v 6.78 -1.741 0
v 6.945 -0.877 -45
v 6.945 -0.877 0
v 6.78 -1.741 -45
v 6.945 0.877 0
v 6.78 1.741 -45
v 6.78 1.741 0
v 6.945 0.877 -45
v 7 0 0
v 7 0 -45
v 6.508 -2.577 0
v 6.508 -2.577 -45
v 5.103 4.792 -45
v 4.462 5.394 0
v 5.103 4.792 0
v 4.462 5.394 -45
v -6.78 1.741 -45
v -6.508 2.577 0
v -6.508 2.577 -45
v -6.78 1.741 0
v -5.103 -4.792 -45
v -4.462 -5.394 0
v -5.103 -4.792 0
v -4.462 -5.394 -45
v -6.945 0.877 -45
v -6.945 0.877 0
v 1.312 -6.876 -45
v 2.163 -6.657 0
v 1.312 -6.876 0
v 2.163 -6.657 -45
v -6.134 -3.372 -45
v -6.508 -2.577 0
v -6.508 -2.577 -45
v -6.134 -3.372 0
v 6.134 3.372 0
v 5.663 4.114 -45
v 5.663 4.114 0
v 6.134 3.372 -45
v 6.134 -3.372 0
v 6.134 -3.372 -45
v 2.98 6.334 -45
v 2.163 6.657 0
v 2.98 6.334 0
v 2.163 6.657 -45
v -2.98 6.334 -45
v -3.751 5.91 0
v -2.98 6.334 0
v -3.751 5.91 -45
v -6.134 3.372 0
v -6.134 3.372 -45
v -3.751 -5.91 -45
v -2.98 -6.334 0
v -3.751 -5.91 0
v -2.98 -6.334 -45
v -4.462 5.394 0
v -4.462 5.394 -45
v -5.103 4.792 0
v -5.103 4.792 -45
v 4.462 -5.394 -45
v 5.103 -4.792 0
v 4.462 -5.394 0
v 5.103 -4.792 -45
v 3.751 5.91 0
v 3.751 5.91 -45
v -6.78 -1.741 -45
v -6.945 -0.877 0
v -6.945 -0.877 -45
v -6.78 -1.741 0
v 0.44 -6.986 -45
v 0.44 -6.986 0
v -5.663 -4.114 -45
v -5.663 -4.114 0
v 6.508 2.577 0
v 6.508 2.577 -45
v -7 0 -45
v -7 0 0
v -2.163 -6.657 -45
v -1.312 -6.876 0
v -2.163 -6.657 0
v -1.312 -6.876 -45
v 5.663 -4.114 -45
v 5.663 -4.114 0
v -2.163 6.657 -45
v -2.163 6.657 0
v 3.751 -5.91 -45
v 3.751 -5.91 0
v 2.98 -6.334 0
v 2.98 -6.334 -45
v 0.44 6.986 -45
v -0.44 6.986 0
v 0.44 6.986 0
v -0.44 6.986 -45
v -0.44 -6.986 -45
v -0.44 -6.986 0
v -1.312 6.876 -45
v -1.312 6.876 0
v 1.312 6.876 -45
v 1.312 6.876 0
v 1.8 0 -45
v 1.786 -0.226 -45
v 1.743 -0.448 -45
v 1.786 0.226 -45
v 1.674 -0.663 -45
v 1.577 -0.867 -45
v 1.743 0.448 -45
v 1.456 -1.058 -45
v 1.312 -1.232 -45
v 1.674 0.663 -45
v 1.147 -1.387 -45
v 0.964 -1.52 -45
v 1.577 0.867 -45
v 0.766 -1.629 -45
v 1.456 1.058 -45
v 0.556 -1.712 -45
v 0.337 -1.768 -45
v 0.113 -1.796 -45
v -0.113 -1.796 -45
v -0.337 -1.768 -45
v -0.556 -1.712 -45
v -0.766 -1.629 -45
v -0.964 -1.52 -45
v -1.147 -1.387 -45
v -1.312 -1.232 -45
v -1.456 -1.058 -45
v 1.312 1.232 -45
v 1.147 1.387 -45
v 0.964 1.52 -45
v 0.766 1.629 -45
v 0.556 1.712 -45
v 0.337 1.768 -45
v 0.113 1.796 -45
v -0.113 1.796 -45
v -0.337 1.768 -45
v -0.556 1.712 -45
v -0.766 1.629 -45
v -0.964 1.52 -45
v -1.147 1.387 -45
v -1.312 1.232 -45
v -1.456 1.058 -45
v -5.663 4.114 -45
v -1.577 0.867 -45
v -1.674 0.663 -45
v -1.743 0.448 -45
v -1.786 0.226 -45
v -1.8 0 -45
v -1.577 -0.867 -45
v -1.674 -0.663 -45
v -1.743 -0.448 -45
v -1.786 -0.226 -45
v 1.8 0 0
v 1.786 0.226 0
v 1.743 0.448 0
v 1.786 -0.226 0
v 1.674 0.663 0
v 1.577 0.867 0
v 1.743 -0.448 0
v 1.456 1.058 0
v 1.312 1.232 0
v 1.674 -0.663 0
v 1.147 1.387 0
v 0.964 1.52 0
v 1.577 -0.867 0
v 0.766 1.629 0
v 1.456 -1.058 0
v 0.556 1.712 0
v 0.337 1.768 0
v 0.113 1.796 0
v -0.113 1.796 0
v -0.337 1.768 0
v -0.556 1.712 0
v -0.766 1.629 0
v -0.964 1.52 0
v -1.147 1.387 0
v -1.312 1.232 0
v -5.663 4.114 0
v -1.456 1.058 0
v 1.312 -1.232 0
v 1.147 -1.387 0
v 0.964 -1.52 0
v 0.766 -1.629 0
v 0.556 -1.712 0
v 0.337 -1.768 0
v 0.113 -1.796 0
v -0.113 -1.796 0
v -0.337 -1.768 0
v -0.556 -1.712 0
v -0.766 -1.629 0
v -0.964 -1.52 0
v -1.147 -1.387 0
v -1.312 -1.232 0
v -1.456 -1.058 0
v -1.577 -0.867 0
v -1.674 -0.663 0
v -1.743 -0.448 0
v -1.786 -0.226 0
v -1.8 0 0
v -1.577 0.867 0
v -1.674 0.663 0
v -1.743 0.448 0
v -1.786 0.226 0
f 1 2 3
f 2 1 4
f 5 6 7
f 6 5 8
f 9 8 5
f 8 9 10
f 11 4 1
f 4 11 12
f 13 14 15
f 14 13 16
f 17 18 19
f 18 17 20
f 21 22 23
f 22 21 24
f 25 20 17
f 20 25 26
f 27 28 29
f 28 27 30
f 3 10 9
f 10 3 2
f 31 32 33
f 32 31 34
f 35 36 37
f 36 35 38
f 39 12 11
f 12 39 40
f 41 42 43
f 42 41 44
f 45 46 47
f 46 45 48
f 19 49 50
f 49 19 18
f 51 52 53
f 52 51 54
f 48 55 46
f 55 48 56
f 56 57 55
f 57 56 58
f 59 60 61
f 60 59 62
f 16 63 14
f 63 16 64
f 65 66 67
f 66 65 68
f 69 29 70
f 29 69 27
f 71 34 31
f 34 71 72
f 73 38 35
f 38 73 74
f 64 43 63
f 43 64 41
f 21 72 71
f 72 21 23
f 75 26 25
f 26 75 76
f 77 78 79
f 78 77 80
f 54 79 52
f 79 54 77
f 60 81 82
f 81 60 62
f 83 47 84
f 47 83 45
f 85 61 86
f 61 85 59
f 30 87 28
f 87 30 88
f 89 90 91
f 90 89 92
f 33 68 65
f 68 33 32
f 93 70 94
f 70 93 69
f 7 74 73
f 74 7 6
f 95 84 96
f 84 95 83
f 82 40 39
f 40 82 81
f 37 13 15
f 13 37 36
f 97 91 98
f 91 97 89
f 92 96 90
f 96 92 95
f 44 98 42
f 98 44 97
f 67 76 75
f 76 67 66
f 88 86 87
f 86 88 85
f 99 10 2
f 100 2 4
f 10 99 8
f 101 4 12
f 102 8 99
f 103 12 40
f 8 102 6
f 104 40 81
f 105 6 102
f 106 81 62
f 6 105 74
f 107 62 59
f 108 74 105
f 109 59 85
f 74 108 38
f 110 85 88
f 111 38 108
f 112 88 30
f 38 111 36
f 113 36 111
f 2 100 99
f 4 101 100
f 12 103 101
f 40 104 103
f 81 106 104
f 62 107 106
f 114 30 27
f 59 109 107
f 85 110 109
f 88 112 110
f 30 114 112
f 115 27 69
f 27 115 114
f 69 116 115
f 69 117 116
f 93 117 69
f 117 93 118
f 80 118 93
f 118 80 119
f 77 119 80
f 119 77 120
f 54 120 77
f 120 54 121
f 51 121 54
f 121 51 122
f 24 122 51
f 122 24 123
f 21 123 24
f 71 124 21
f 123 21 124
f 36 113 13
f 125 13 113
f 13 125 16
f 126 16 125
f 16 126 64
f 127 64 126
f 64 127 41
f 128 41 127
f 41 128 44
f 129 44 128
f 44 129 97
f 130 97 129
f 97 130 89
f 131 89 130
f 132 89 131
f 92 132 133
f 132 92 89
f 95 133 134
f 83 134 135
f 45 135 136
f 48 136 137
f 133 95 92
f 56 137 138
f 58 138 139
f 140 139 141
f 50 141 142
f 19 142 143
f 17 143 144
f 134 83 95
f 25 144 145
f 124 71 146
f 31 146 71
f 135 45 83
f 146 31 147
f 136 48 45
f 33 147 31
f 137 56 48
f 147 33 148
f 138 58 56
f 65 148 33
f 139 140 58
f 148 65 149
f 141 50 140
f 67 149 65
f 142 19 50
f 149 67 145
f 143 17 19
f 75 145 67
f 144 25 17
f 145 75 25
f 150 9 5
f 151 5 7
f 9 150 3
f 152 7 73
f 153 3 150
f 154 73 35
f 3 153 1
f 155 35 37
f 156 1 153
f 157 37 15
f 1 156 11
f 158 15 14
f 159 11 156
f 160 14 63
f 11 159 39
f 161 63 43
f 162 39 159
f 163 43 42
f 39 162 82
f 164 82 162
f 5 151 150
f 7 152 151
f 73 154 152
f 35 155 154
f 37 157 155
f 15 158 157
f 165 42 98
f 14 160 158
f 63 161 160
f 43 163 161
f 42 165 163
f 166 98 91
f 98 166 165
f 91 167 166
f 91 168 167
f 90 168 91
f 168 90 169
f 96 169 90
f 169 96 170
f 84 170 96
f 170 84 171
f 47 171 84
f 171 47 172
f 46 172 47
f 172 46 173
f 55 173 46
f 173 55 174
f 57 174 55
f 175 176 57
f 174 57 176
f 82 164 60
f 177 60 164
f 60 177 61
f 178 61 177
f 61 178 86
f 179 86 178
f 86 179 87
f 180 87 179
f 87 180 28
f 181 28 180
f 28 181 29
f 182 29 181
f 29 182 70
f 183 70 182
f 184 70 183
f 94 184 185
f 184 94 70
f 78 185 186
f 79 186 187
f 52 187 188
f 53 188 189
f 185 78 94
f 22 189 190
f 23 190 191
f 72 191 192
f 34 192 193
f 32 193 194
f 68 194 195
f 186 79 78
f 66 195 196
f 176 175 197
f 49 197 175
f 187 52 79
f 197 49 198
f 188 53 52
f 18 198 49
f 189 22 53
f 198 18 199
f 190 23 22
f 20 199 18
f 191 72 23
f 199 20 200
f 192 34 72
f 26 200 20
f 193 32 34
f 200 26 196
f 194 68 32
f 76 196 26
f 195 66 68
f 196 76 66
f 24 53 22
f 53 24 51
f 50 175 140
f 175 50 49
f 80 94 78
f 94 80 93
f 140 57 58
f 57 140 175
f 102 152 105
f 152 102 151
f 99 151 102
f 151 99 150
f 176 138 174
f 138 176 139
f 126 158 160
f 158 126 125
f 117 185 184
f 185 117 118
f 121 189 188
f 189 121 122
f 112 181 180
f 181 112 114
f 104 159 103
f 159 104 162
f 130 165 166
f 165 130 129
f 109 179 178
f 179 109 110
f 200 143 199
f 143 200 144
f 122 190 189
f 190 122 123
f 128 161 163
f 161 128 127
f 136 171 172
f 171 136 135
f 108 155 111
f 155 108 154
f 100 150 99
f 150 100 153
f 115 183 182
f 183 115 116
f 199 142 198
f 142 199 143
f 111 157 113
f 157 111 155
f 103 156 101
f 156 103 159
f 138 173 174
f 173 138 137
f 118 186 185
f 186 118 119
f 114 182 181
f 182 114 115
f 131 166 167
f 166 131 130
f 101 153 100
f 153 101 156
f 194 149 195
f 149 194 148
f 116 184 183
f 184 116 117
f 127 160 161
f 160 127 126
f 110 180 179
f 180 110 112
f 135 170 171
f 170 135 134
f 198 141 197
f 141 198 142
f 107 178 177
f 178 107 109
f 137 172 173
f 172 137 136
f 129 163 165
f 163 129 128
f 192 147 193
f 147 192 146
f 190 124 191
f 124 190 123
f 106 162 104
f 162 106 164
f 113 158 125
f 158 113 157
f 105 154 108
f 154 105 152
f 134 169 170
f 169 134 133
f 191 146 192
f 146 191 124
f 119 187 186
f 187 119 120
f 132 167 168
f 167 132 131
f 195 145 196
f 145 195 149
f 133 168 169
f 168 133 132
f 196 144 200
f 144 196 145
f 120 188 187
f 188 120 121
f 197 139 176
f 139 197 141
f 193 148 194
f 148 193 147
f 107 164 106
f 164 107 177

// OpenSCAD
$fn = 50;


difference() {
	union() {
		translate(v = [0, 0, -45.0000000000]) {
			cylinder(h = 45, r = 7.0000000000);
		}
		cylinder(h = 0, r = 16.0000000000);
	}
	union() {
		#translate(v = [0, 0, -45]) {
			cylinder(h = 45, r = 1.8000000000);
		}
	}
}
